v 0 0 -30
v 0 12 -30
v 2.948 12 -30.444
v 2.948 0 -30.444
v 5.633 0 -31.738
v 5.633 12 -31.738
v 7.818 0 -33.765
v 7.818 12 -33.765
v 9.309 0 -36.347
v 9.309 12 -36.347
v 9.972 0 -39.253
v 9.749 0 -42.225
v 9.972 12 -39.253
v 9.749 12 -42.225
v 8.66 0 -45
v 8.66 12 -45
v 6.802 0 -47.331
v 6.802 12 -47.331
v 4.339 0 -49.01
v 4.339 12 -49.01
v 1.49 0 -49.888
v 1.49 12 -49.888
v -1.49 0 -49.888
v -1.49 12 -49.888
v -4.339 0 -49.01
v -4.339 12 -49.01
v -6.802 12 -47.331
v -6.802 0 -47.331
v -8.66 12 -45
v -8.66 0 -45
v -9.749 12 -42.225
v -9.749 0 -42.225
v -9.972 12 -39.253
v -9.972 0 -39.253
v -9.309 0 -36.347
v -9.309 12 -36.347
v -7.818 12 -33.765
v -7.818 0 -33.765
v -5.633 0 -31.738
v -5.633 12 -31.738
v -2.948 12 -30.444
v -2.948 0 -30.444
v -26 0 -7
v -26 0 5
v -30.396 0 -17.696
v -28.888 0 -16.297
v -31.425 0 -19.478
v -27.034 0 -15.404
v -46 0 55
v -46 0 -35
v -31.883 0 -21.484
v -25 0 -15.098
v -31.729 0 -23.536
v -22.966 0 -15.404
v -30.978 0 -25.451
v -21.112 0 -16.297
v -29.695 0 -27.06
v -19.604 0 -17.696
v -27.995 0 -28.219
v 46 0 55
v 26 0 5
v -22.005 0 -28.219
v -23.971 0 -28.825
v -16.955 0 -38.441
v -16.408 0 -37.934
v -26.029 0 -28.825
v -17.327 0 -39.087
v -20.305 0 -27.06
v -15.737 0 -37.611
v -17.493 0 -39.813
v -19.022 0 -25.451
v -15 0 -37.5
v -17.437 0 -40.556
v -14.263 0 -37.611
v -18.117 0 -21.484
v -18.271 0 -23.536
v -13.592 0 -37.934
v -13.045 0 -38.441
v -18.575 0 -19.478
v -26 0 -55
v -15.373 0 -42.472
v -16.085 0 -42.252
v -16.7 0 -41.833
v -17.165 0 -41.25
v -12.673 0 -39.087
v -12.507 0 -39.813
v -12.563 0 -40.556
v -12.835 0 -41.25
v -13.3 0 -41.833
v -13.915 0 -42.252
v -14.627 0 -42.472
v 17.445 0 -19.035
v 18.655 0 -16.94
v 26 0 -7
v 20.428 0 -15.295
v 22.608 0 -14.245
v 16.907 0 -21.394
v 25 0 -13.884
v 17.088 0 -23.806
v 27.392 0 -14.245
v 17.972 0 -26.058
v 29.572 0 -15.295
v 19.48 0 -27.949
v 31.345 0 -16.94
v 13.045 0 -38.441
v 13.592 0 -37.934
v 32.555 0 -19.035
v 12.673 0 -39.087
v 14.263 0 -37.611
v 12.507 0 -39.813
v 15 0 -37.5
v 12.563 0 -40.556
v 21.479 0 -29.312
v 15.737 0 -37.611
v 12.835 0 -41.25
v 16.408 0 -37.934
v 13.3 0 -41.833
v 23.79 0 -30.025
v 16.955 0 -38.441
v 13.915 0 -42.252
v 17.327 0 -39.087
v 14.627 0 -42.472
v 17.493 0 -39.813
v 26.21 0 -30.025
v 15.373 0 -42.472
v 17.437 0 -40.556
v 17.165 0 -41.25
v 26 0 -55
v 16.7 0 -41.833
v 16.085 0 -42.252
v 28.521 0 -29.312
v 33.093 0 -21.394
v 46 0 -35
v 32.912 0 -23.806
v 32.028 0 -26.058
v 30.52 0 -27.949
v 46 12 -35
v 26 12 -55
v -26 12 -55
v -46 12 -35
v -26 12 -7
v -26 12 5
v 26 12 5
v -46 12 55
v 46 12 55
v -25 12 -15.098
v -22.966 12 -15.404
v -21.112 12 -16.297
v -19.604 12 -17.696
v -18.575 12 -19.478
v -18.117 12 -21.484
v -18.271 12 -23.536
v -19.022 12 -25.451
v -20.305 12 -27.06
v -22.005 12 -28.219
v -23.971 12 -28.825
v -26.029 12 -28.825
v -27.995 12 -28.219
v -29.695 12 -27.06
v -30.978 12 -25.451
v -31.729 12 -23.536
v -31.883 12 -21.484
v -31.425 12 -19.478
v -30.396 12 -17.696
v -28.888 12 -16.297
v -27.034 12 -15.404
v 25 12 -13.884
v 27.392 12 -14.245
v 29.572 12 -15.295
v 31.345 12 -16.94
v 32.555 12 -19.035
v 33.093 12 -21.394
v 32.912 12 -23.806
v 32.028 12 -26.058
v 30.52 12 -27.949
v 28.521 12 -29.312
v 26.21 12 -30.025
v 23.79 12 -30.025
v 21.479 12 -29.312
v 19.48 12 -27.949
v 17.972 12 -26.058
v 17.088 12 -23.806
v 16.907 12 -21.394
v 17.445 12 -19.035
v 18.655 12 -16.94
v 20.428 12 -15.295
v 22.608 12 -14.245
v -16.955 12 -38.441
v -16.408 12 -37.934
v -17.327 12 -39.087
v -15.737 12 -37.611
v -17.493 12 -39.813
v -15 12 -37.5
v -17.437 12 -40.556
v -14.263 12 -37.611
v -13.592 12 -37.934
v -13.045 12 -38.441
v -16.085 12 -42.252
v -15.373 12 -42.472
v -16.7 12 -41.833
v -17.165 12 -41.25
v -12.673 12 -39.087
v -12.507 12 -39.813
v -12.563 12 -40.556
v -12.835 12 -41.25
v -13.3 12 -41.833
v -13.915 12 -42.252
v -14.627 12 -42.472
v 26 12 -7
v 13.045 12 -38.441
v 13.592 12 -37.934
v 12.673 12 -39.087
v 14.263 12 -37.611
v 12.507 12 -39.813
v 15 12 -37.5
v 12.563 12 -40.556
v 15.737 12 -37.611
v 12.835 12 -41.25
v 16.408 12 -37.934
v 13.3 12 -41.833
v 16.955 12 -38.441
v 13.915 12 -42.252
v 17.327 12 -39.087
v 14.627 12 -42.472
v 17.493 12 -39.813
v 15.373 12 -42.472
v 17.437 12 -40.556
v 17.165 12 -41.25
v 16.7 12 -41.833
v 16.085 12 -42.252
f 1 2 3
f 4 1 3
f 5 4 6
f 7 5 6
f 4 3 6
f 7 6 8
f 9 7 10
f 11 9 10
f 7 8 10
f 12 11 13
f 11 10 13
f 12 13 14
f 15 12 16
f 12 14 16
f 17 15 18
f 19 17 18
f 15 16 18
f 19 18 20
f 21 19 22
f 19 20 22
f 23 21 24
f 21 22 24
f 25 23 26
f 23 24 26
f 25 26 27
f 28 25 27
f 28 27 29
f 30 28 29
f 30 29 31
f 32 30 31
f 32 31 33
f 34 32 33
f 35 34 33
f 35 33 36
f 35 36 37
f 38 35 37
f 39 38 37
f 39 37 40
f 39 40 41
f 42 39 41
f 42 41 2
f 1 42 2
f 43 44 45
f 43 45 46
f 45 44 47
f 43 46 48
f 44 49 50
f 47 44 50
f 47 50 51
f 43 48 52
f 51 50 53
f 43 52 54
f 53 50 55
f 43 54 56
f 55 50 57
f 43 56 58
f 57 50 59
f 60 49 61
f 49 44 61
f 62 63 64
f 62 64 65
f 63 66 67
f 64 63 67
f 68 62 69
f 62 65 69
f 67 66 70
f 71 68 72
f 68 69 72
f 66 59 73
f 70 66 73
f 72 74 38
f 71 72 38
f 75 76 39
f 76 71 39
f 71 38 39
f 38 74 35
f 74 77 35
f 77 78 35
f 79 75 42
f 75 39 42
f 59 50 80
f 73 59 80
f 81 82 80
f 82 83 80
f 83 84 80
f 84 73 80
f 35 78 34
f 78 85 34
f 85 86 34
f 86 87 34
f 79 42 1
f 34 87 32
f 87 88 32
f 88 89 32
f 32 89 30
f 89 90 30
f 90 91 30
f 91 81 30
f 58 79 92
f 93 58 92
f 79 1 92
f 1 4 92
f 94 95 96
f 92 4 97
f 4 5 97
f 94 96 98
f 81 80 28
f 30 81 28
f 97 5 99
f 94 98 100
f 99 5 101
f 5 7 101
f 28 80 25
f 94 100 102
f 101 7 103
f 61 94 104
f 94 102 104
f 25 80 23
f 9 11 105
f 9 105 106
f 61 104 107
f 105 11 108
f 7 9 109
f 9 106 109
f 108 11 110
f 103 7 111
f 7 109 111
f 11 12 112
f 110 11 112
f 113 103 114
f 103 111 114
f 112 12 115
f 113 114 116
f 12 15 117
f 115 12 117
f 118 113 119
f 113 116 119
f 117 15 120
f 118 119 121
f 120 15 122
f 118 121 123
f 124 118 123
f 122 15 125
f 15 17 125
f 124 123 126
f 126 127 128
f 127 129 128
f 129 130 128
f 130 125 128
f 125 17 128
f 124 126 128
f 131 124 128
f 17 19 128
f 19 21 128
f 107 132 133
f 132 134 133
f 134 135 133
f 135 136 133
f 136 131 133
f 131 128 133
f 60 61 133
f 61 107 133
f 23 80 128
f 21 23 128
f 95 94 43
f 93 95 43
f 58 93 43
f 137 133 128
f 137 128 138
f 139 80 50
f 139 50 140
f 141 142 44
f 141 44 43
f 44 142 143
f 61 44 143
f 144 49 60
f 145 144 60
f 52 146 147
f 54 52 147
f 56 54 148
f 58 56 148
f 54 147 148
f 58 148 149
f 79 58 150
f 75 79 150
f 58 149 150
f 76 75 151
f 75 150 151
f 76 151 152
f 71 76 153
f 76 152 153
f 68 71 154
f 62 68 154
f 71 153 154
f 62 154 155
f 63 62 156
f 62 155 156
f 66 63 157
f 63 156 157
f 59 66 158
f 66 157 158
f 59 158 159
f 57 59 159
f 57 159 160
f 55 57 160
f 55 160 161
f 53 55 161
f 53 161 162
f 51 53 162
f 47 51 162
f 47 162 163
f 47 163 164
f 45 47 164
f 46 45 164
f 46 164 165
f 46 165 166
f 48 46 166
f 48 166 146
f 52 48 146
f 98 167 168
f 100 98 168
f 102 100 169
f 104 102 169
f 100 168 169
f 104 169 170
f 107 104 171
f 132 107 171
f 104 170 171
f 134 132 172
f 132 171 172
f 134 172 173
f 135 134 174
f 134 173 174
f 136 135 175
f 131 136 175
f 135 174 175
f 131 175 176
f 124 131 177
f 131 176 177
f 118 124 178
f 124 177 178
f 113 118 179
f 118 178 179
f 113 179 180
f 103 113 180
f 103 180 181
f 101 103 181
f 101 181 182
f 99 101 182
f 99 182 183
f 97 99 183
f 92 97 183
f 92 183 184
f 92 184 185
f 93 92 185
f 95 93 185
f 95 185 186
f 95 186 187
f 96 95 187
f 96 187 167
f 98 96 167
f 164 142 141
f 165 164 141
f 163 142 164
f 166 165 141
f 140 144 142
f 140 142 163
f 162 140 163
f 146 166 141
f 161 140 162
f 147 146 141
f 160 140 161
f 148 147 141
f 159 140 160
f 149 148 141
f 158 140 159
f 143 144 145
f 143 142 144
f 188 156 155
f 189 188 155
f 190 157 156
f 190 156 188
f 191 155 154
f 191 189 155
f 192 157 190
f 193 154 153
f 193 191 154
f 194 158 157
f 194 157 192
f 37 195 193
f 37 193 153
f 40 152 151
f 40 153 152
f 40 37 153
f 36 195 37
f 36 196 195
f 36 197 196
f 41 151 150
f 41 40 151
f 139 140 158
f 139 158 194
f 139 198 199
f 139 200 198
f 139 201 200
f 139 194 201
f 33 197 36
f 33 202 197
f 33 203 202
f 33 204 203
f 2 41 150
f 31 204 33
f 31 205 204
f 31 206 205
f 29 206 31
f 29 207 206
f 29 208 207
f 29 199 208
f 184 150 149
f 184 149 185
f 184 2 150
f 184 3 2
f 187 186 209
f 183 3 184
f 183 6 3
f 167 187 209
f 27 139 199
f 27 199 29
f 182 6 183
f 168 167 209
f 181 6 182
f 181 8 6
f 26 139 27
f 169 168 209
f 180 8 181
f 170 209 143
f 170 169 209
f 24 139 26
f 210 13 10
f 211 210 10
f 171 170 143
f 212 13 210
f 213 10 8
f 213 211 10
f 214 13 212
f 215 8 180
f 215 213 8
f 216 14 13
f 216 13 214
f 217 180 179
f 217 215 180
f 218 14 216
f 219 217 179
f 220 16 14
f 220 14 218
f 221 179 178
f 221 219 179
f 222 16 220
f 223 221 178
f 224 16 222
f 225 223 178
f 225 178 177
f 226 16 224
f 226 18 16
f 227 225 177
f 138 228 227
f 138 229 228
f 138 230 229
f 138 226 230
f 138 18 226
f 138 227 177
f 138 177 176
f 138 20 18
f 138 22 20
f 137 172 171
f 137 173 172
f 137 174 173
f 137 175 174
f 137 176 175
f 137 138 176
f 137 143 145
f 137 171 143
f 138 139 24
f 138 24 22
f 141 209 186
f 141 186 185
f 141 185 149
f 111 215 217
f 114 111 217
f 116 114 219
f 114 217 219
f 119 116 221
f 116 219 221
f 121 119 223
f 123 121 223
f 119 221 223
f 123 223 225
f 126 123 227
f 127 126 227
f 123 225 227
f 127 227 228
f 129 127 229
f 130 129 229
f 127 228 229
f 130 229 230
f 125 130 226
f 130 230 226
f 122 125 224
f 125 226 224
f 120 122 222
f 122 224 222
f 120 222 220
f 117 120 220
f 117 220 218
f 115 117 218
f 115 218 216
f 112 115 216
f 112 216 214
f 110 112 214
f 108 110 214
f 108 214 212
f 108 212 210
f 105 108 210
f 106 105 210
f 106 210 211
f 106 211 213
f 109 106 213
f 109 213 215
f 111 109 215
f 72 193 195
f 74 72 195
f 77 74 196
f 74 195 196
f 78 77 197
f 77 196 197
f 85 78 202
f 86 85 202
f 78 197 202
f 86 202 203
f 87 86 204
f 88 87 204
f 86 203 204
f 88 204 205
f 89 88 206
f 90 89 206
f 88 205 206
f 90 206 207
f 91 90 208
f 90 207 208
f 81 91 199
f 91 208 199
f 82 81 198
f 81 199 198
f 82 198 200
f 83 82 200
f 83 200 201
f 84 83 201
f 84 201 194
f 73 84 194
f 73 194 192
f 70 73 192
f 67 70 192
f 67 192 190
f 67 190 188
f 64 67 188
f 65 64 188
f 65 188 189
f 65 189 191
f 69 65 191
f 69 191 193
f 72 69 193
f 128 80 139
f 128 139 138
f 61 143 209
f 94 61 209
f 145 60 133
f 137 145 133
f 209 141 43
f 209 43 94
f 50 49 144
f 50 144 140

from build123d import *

# Parameters (mm, degrees)
SKETCH1_W           = 92
SKETCH1_H           = 110
BOSS_EXTRUDE1_DEPTH = 12
CUT_EXTRUDE1_REACH  = 74.698
SKETCH2_R           = 10
SKETCH2_R_2         = 6.902314271
SKETCH2_R_3         = 8.115527509
SKETCH2_R_4         = 2.5
CUT_EXTRUDE2_REACH  = 74.698
SKETCH3_W           = 52
SKETCH3_H           = 12
CHAMFER1_SIZE       = 20


with BuildPart() as part:
    # Sketch1 → Boss-Extrude1 (new body)
    with BuildSketch(Plane(origin=(0, 0, 0), x_dir=(1, 0, 0), z_dir=(0, 1, 0))):
        Rectangle(SKETCH1_W, SKETCH1_H)
    extrude(amount=BOSS_EXTRUDE1_DEPTH)

    # Sketch2 → Cut-Extrude1 (cut, up to next)
    with BuildSketch(Plane(origin=(0, 12, 0), x_dir=(1, 0, 0), z_dir=(0, 1, 0)), mode=Mode.PRIVATE) as cut_extrude1_sk1:
        with Locations(Location((0, 40, 0), (0, 0, 270))):
            Circle(SKETCH2_R)
    cut_extrude1_tool1 = extrude(cut_extrude1_sk1.sketch, amount=-CUT_EXTRUDE1_REACH, mode=Mode.PRIVATE) & part.part
    # Sketch2 → Cut-Extrude1 (cut, up to next)
    with BuildSketch(Plane(origin=(0, 12, 0), x_dir=(1, 0, 0), z_dir=(0, 1, 0)), mode=Mode.PRIVATE) as cut_extrude1_sk2:
        with Locations(Location((-25, 22, 0), (0, 0, 270))):
            Circle(SKETCH2_R_2)
    cut_extrude1_tool2 = extrude(cut_extrude1_sk2.sketch, amount=-CUT_EXTRUDE1_REACH, mode=Mode.PRIVATE) & part.part
    # Sketch2 → Cut-Extrude1 (cut, up to next)
    with BuildSketch(Plane(origin=(0, 12, 0), x_dir=(1, 0, 0), z_dir=(0, 1, 0)), mode=Mode.PRIVATE) as cut_extrude1_sk3:
        with Locations(Location((25, 22, 0), (0, 0, 270))):
            Circle(SKETCH2_R_3)
    cut_extrude1_tool3 = extrude(cut_extrude1_sk3.sketch, amount=-CUT_EXTRUDE1_REACH, mode=Mode.PRIVATE) & part.part
    # Sketch2 → Cut-Extrude1 (cut, up to next)
    with BuildSketch(Plane(origin=(0, 12, 0), x_dir=(1, 0, 0), z_dir=(0, 1, 0)), mode=Mode.PRIVATE) as cut_extrude1_sk4:
        with Locations(Location((-15, 40, 0), (0, 0, 270))):
            Circle(SKETCH2_R_4)
    cut_extrude1_tool4 = extrude(cut_extrude1_sk4.sketch, amount=-CUT_EXTRUDE1_REACH, mode=Mode.PRIVATE) & part.part
    # Sketch2 → Cut-Extrude1 (cut, up to next)
    with BuildSketch(Plane(origin=(0, 12, 0), x_dir=(1, 0, 0), z_dir=(0, 1, 0)), mode=Mode.PRIVATE) as cut_extrude1_sk5:
        with Locations(Location((15, 40, 0), (0, 0, 270))):
            Circle(SKETCH2_R_4)
    cut_extrude1_tool5 = extrude(cut_extrude1_sk5.sketch, amount=-CUT_EXTRUDE1_REACH, mode=Mode.PRIVATE) & part.part
    add(cut_extrude1_tool1.solids().sort_by_distance((0, 12, -40))[0], mode=Mode.SUBTRACT)
    add(cut_extrude1_tool2.solids().sort_by_distance((-25, 12, -22))[0], mode=Mode.SUBTRACT)
    add(cut_extrude1_tool3.solids().sort_by_distance((25, 12, -22))[0], mode=Mode.SUBTRACT)
    add(cut_extrude1_tool4.solids().sort_by_distance((-15, 12, -40))[0], mode=Mode.SUBTRACT)
    add(cut_extrude1_tool5.solids().sort_by_distance((15, 12, -40))[0], mode=Mode.SUBTRACT)

    # Sketch3 → Cut-Extrude2 (cut, up to next)
    with BuildSketch(Plane(origin=(0, 12, 0), x_dir=(1, 0, 0), z_dir=(0, 1, 0)), mode=Mode.PRIVATE) as cut_extrude2_sk1:
        with Locations((0, 1)):
            Rectangle(SKETCH3_W, SKETCH3_H)
    cut_extrude2_tool1 = extrude(cut_extrude2_sk1.sketch, amount=-CUT_EXTRUDE2_REACH, mode=Mode.PRIVATE) & part.part
    add(cut_extrude2_tool1.solids().sort_by_distance((0, 12, -1))[0], mode=Mode.SUBTRACT)

    # Chamfer1
    chamfer1_edges = [part.edges().sort_by_distance(p)[0] for p in [
        (-46, 6, -55),
        (46, 6, -55),
    ]]
    chamfer(chamfer1_edges, length=CHAMFER1_SIZE)


solid = part.part
